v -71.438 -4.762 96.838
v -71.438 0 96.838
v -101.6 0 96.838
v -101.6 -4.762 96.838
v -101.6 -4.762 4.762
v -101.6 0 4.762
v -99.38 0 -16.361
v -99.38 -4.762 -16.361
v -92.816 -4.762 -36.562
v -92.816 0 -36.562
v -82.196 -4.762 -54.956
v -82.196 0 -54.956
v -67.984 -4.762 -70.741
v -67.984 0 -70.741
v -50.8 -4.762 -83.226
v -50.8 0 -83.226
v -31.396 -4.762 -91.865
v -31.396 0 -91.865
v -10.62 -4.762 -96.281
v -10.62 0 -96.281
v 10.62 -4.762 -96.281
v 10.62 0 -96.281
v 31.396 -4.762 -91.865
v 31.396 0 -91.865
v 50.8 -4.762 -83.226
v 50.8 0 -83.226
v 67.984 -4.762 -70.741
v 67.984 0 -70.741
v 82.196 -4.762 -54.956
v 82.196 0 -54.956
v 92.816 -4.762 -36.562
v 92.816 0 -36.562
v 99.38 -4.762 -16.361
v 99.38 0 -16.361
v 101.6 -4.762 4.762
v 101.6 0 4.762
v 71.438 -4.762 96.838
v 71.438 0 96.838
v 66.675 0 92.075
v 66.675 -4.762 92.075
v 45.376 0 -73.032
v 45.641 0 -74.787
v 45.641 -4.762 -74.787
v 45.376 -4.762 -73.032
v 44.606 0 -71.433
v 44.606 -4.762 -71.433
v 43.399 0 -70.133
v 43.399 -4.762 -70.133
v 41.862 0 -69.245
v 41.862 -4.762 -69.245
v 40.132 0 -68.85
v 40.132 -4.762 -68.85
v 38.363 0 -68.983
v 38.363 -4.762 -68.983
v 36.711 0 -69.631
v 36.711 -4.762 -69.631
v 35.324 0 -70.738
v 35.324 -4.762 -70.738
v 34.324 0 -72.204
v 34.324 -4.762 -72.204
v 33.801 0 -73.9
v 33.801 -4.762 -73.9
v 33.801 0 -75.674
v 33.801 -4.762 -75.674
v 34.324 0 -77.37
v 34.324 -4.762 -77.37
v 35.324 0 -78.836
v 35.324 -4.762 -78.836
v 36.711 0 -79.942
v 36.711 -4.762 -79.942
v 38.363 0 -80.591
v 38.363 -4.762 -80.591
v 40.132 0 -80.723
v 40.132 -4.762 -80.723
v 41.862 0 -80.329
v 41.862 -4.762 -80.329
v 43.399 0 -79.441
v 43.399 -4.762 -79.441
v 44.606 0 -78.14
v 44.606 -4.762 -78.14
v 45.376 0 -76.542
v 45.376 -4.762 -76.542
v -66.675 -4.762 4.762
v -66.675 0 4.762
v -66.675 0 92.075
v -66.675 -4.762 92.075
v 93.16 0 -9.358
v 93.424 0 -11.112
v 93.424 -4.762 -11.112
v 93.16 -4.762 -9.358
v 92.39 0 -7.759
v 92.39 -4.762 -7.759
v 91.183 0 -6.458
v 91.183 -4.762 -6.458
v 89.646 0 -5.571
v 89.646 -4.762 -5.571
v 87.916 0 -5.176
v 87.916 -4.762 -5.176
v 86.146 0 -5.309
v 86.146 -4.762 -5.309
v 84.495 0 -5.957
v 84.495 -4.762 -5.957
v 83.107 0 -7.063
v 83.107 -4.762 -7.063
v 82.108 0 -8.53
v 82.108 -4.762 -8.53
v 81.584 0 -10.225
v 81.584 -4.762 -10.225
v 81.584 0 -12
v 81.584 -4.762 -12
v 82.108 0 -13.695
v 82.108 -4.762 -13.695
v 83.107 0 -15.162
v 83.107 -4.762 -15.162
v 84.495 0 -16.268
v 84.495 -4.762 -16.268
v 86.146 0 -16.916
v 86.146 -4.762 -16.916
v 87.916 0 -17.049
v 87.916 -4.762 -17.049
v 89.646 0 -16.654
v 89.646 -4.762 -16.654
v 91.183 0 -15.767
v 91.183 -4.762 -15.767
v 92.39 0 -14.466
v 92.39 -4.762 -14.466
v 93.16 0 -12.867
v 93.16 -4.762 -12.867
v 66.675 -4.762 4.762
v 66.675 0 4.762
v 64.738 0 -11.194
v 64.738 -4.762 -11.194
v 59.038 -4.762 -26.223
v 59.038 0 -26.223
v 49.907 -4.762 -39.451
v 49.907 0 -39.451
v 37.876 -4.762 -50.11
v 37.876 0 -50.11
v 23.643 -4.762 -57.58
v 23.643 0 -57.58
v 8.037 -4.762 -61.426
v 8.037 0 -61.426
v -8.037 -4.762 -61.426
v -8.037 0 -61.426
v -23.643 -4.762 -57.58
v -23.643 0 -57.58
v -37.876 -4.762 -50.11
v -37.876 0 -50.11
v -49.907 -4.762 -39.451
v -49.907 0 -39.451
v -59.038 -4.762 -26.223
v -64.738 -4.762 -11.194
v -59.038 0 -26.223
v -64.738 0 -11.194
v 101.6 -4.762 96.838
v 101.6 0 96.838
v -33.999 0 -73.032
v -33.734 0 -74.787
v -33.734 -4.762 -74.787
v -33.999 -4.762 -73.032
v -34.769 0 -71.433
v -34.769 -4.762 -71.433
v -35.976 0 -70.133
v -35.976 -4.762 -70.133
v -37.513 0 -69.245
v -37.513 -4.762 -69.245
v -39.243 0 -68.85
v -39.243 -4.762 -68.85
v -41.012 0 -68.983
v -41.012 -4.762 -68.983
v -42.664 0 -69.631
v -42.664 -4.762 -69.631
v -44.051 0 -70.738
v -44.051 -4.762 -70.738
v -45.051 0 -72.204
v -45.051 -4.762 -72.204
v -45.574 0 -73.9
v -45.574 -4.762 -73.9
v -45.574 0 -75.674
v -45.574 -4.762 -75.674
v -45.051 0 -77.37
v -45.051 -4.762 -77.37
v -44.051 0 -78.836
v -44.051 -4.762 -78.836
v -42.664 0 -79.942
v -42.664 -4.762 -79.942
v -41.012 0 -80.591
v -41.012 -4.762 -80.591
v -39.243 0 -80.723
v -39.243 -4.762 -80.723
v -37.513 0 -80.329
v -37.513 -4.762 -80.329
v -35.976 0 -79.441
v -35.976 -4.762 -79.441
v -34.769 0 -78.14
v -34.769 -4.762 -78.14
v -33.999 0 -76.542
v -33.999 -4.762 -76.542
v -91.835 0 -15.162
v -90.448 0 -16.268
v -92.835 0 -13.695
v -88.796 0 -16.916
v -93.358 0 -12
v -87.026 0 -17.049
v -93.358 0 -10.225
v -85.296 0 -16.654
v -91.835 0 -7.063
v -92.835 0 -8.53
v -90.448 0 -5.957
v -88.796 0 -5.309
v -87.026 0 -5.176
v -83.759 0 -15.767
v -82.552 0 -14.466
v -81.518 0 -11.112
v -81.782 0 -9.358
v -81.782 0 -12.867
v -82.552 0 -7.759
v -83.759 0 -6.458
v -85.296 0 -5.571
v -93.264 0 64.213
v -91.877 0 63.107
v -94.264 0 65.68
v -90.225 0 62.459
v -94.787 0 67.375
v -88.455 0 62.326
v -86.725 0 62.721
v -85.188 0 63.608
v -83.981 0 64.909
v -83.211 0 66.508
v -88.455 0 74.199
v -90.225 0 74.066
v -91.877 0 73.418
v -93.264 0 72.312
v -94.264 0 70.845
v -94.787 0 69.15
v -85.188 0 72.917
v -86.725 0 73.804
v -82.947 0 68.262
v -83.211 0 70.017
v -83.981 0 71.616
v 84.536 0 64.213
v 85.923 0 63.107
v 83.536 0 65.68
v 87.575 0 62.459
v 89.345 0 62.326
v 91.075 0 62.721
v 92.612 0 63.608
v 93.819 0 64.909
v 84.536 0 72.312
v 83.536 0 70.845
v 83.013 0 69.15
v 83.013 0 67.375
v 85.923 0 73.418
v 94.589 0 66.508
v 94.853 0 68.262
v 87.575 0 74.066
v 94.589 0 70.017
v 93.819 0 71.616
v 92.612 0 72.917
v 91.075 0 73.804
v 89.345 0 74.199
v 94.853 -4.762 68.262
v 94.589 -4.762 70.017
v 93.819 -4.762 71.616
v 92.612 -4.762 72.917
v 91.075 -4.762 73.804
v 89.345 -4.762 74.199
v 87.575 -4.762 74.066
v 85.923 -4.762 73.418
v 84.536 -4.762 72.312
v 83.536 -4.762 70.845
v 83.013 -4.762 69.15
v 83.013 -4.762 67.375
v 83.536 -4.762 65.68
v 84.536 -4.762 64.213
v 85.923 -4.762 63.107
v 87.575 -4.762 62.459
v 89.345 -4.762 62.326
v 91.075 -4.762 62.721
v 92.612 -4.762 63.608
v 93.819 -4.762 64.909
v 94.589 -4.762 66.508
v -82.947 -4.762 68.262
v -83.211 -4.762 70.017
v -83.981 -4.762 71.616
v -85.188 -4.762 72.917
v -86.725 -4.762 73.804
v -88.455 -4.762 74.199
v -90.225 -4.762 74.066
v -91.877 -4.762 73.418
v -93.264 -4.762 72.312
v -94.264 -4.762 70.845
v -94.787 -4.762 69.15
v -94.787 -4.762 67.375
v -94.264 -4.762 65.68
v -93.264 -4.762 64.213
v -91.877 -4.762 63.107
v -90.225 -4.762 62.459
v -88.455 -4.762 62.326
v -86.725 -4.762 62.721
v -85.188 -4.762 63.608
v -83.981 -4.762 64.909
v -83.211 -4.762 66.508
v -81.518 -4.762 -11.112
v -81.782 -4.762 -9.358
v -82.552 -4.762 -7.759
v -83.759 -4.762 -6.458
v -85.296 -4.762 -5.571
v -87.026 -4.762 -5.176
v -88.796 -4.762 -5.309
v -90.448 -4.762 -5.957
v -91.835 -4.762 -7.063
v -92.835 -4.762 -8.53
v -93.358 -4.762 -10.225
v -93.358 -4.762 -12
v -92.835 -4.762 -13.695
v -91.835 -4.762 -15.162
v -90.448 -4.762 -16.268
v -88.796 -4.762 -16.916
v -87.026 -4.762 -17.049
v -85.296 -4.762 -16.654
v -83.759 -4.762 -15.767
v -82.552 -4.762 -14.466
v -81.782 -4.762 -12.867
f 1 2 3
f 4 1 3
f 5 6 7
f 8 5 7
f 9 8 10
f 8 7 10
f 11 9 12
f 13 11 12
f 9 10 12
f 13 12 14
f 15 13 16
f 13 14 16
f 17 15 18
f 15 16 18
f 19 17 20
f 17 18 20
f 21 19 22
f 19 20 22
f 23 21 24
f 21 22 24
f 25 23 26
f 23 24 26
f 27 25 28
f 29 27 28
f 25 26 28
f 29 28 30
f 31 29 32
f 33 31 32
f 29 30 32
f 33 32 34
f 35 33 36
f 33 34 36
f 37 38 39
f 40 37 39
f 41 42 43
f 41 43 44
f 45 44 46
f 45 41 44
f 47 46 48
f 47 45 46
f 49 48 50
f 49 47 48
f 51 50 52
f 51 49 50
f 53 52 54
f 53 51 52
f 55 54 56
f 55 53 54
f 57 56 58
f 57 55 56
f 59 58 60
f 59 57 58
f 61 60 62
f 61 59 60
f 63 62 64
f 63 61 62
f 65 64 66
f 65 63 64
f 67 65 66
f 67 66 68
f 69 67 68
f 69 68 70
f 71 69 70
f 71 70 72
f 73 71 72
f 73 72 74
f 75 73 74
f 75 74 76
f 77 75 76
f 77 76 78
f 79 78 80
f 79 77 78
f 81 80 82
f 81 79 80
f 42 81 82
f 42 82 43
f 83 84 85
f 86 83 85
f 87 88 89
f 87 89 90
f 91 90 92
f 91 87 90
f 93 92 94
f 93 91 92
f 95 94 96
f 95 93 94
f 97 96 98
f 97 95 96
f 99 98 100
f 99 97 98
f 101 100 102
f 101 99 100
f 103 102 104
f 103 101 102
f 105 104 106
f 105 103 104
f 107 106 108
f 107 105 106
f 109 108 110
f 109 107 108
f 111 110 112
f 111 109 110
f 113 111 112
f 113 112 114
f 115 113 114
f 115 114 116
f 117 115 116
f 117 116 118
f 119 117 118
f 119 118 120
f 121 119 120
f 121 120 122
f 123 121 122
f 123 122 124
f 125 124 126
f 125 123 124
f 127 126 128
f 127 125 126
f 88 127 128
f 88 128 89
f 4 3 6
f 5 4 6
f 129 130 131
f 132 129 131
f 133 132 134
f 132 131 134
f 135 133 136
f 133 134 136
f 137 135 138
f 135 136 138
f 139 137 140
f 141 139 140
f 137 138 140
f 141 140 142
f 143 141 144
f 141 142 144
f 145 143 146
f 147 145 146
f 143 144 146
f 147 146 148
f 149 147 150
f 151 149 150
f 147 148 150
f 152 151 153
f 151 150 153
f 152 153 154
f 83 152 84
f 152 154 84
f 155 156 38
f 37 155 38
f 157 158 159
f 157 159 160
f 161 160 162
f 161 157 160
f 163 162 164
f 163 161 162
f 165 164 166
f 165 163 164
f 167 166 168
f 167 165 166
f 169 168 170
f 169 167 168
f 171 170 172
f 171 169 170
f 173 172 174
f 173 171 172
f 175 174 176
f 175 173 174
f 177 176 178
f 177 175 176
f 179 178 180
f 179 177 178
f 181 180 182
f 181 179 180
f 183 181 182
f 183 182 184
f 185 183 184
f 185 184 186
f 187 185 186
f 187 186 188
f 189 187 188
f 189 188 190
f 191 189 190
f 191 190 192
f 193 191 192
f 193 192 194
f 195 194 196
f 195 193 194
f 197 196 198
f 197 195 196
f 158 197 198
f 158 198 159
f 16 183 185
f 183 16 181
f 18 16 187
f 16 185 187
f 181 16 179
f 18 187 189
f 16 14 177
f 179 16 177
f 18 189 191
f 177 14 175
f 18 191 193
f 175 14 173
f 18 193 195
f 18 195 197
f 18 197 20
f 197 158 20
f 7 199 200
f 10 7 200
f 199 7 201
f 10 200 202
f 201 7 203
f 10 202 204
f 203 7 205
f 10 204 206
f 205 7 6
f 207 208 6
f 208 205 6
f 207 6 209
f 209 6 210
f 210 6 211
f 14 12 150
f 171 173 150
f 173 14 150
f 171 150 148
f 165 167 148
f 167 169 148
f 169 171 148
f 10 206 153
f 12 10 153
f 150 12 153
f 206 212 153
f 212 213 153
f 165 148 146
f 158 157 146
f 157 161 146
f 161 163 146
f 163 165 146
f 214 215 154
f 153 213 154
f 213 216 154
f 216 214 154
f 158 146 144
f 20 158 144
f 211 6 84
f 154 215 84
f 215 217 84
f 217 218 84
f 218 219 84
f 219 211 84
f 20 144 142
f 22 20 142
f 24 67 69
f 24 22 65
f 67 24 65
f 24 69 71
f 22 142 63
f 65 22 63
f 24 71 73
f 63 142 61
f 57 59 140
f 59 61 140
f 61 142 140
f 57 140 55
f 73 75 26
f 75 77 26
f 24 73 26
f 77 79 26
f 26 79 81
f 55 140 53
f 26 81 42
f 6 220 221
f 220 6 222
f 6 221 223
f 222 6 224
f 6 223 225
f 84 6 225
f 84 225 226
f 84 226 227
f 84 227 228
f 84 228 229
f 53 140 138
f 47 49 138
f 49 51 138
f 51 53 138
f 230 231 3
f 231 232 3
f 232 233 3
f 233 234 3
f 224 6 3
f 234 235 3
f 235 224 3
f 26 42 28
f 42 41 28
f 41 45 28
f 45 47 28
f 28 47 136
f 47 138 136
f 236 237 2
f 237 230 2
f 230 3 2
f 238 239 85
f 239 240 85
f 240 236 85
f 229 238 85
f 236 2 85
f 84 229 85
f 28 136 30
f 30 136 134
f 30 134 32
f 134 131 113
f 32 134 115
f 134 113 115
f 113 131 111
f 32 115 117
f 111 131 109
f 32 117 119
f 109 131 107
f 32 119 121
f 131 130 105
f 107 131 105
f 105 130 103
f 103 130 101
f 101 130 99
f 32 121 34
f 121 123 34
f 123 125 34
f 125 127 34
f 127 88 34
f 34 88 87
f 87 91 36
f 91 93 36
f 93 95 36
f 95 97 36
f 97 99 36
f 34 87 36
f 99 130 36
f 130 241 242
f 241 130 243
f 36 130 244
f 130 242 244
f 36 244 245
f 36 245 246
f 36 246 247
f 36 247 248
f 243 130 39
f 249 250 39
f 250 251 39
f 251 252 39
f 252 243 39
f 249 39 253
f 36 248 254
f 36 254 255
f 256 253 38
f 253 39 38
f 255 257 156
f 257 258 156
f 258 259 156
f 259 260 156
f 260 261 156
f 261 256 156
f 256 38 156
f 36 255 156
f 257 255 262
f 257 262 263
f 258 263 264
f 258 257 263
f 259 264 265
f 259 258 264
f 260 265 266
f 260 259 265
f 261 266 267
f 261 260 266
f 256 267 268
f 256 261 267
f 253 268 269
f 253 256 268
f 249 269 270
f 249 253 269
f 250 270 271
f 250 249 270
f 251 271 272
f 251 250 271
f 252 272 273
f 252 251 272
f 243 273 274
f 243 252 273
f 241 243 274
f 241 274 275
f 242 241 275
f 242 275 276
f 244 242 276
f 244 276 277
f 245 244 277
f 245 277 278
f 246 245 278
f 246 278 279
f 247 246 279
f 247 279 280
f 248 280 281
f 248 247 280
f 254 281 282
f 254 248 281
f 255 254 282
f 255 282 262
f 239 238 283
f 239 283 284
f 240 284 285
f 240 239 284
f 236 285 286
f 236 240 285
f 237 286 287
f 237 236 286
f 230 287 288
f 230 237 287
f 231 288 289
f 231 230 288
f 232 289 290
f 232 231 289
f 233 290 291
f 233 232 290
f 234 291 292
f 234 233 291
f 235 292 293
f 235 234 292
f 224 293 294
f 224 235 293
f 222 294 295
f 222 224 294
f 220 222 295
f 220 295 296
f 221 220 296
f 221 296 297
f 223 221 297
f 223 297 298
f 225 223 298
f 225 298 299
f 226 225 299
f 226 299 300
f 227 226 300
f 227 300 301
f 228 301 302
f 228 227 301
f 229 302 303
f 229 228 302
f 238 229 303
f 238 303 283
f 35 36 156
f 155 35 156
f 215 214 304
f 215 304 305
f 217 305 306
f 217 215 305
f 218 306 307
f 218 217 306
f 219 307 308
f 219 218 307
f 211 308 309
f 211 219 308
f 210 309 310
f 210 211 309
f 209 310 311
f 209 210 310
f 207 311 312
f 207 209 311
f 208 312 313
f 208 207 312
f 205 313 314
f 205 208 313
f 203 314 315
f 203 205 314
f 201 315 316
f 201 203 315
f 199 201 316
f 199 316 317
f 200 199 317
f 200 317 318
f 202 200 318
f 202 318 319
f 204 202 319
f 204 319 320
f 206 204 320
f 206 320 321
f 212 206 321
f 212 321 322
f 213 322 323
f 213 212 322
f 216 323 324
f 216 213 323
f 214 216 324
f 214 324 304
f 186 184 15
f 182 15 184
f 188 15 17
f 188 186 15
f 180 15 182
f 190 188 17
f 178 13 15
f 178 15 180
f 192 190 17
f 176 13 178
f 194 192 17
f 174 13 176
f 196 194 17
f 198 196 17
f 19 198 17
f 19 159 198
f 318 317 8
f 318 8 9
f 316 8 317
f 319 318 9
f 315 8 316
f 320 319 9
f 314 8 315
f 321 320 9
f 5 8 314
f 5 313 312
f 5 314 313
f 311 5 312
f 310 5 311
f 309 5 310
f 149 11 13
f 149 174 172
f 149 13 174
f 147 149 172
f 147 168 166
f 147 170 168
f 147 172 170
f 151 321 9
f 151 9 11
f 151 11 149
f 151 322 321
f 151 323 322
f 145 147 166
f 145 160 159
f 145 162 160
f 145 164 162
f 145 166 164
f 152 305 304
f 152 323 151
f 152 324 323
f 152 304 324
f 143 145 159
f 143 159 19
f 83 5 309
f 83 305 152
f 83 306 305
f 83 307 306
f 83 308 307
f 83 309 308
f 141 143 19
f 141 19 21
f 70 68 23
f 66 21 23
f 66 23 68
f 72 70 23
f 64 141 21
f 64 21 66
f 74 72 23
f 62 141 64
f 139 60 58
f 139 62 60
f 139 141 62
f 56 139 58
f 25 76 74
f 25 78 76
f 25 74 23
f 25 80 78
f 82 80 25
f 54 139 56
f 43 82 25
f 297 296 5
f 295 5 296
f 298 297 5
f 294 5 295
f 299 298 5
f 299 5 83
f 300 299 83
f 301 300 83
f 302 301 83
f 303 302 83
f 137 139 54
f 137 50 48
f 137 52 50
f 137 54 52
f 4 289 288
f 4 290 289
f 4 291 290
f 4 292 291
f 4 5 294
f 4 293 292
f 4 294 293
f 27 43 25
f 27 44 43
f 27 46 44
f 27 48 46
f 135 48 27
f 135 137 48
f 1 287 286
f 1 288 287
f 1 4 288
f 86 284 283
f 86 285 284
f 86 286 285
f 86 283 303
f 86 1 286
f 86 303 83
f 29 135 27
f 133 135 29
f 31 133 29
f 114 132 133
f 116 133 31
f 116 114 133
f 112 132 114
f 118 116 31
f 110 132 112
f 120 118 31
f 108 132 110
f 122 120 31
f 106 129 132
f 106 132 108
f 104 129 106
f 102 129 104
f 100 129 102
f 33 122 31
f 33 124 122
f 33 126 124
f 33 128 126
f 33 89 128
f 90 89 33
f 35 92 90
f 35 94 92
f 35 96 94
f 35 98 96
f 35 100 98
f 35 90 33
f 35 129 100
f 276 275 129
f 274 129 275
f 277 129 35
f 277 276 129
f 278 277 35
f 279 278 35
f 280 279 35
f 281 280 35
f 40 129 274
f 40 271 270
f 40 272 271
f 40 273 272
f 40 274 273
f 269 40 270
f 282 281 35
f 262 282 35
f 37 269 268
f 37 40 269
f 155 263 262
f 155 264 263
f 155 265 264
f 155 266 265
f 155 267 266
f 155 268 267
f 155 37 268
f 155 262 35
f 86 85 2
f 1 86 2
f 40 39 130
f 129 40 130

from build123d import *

# Parameters (mm, degrees)
F0_R     = 5.953125
F1_DEPTH = 4.7625


with BuildPart() as f1:
    # F0 (on Front) → F1 (new body)
    with BuildSketch(Plane.XZ):
        with BuildLine():
            Line((101.6, 4.7625), (101.6, 96.8375))
            Line((101.6, 96.8375), (71.4375, 96.8375))
            Line((71.4375, 96.8375), (66.675, 92.075))
            Line((66.675, 92.075), (66.675, 4.7625))
            ThreePointArc((66.675, 4.7625), (0, -61.9125), (-66.675, 4.7625))
            Line((-66.675, 4.7625), (-66.675, 92.075))
            Line((-66.675, 92.075), (-71.4375, 96.8375))
            Line((-71.4375, 96.8375), (-101.6, 96.8375))
            Line((-101.6, 96.8375), (-101.6, 4.7625))
            ThreePointArc((-101.6, 4.7625), (0, -96.8375), (101.6, 4.7625))
        make_face()
        with Locations((-39.6875, -74.786922)):
            Circle(F0_R, mode=Mode.SUBTRACT)
        with Locations((-87.471098, -11.1125)):
            Circle(F0_R, mode=Mode.SUBTRACT)
        with Locations((39.6875, -74.786922)):
            Circle(F0_R, mode=Mode.SUBTRACT)
        with Locations((87.471098, -11.1125)):
            Circle(F0_R, mode=Mode.SUBTRACT)
        with Locations((-88.9, 68.2625)):
            Circle(F0_R, mode=Mode.SUBTRACT)
        with Locations((88.9, 68.2625)):
            Circle(F0_R, mode=Mode.SUBTRACT)
    extrude(amount=F1_DEPTH)


solid = f1.part
